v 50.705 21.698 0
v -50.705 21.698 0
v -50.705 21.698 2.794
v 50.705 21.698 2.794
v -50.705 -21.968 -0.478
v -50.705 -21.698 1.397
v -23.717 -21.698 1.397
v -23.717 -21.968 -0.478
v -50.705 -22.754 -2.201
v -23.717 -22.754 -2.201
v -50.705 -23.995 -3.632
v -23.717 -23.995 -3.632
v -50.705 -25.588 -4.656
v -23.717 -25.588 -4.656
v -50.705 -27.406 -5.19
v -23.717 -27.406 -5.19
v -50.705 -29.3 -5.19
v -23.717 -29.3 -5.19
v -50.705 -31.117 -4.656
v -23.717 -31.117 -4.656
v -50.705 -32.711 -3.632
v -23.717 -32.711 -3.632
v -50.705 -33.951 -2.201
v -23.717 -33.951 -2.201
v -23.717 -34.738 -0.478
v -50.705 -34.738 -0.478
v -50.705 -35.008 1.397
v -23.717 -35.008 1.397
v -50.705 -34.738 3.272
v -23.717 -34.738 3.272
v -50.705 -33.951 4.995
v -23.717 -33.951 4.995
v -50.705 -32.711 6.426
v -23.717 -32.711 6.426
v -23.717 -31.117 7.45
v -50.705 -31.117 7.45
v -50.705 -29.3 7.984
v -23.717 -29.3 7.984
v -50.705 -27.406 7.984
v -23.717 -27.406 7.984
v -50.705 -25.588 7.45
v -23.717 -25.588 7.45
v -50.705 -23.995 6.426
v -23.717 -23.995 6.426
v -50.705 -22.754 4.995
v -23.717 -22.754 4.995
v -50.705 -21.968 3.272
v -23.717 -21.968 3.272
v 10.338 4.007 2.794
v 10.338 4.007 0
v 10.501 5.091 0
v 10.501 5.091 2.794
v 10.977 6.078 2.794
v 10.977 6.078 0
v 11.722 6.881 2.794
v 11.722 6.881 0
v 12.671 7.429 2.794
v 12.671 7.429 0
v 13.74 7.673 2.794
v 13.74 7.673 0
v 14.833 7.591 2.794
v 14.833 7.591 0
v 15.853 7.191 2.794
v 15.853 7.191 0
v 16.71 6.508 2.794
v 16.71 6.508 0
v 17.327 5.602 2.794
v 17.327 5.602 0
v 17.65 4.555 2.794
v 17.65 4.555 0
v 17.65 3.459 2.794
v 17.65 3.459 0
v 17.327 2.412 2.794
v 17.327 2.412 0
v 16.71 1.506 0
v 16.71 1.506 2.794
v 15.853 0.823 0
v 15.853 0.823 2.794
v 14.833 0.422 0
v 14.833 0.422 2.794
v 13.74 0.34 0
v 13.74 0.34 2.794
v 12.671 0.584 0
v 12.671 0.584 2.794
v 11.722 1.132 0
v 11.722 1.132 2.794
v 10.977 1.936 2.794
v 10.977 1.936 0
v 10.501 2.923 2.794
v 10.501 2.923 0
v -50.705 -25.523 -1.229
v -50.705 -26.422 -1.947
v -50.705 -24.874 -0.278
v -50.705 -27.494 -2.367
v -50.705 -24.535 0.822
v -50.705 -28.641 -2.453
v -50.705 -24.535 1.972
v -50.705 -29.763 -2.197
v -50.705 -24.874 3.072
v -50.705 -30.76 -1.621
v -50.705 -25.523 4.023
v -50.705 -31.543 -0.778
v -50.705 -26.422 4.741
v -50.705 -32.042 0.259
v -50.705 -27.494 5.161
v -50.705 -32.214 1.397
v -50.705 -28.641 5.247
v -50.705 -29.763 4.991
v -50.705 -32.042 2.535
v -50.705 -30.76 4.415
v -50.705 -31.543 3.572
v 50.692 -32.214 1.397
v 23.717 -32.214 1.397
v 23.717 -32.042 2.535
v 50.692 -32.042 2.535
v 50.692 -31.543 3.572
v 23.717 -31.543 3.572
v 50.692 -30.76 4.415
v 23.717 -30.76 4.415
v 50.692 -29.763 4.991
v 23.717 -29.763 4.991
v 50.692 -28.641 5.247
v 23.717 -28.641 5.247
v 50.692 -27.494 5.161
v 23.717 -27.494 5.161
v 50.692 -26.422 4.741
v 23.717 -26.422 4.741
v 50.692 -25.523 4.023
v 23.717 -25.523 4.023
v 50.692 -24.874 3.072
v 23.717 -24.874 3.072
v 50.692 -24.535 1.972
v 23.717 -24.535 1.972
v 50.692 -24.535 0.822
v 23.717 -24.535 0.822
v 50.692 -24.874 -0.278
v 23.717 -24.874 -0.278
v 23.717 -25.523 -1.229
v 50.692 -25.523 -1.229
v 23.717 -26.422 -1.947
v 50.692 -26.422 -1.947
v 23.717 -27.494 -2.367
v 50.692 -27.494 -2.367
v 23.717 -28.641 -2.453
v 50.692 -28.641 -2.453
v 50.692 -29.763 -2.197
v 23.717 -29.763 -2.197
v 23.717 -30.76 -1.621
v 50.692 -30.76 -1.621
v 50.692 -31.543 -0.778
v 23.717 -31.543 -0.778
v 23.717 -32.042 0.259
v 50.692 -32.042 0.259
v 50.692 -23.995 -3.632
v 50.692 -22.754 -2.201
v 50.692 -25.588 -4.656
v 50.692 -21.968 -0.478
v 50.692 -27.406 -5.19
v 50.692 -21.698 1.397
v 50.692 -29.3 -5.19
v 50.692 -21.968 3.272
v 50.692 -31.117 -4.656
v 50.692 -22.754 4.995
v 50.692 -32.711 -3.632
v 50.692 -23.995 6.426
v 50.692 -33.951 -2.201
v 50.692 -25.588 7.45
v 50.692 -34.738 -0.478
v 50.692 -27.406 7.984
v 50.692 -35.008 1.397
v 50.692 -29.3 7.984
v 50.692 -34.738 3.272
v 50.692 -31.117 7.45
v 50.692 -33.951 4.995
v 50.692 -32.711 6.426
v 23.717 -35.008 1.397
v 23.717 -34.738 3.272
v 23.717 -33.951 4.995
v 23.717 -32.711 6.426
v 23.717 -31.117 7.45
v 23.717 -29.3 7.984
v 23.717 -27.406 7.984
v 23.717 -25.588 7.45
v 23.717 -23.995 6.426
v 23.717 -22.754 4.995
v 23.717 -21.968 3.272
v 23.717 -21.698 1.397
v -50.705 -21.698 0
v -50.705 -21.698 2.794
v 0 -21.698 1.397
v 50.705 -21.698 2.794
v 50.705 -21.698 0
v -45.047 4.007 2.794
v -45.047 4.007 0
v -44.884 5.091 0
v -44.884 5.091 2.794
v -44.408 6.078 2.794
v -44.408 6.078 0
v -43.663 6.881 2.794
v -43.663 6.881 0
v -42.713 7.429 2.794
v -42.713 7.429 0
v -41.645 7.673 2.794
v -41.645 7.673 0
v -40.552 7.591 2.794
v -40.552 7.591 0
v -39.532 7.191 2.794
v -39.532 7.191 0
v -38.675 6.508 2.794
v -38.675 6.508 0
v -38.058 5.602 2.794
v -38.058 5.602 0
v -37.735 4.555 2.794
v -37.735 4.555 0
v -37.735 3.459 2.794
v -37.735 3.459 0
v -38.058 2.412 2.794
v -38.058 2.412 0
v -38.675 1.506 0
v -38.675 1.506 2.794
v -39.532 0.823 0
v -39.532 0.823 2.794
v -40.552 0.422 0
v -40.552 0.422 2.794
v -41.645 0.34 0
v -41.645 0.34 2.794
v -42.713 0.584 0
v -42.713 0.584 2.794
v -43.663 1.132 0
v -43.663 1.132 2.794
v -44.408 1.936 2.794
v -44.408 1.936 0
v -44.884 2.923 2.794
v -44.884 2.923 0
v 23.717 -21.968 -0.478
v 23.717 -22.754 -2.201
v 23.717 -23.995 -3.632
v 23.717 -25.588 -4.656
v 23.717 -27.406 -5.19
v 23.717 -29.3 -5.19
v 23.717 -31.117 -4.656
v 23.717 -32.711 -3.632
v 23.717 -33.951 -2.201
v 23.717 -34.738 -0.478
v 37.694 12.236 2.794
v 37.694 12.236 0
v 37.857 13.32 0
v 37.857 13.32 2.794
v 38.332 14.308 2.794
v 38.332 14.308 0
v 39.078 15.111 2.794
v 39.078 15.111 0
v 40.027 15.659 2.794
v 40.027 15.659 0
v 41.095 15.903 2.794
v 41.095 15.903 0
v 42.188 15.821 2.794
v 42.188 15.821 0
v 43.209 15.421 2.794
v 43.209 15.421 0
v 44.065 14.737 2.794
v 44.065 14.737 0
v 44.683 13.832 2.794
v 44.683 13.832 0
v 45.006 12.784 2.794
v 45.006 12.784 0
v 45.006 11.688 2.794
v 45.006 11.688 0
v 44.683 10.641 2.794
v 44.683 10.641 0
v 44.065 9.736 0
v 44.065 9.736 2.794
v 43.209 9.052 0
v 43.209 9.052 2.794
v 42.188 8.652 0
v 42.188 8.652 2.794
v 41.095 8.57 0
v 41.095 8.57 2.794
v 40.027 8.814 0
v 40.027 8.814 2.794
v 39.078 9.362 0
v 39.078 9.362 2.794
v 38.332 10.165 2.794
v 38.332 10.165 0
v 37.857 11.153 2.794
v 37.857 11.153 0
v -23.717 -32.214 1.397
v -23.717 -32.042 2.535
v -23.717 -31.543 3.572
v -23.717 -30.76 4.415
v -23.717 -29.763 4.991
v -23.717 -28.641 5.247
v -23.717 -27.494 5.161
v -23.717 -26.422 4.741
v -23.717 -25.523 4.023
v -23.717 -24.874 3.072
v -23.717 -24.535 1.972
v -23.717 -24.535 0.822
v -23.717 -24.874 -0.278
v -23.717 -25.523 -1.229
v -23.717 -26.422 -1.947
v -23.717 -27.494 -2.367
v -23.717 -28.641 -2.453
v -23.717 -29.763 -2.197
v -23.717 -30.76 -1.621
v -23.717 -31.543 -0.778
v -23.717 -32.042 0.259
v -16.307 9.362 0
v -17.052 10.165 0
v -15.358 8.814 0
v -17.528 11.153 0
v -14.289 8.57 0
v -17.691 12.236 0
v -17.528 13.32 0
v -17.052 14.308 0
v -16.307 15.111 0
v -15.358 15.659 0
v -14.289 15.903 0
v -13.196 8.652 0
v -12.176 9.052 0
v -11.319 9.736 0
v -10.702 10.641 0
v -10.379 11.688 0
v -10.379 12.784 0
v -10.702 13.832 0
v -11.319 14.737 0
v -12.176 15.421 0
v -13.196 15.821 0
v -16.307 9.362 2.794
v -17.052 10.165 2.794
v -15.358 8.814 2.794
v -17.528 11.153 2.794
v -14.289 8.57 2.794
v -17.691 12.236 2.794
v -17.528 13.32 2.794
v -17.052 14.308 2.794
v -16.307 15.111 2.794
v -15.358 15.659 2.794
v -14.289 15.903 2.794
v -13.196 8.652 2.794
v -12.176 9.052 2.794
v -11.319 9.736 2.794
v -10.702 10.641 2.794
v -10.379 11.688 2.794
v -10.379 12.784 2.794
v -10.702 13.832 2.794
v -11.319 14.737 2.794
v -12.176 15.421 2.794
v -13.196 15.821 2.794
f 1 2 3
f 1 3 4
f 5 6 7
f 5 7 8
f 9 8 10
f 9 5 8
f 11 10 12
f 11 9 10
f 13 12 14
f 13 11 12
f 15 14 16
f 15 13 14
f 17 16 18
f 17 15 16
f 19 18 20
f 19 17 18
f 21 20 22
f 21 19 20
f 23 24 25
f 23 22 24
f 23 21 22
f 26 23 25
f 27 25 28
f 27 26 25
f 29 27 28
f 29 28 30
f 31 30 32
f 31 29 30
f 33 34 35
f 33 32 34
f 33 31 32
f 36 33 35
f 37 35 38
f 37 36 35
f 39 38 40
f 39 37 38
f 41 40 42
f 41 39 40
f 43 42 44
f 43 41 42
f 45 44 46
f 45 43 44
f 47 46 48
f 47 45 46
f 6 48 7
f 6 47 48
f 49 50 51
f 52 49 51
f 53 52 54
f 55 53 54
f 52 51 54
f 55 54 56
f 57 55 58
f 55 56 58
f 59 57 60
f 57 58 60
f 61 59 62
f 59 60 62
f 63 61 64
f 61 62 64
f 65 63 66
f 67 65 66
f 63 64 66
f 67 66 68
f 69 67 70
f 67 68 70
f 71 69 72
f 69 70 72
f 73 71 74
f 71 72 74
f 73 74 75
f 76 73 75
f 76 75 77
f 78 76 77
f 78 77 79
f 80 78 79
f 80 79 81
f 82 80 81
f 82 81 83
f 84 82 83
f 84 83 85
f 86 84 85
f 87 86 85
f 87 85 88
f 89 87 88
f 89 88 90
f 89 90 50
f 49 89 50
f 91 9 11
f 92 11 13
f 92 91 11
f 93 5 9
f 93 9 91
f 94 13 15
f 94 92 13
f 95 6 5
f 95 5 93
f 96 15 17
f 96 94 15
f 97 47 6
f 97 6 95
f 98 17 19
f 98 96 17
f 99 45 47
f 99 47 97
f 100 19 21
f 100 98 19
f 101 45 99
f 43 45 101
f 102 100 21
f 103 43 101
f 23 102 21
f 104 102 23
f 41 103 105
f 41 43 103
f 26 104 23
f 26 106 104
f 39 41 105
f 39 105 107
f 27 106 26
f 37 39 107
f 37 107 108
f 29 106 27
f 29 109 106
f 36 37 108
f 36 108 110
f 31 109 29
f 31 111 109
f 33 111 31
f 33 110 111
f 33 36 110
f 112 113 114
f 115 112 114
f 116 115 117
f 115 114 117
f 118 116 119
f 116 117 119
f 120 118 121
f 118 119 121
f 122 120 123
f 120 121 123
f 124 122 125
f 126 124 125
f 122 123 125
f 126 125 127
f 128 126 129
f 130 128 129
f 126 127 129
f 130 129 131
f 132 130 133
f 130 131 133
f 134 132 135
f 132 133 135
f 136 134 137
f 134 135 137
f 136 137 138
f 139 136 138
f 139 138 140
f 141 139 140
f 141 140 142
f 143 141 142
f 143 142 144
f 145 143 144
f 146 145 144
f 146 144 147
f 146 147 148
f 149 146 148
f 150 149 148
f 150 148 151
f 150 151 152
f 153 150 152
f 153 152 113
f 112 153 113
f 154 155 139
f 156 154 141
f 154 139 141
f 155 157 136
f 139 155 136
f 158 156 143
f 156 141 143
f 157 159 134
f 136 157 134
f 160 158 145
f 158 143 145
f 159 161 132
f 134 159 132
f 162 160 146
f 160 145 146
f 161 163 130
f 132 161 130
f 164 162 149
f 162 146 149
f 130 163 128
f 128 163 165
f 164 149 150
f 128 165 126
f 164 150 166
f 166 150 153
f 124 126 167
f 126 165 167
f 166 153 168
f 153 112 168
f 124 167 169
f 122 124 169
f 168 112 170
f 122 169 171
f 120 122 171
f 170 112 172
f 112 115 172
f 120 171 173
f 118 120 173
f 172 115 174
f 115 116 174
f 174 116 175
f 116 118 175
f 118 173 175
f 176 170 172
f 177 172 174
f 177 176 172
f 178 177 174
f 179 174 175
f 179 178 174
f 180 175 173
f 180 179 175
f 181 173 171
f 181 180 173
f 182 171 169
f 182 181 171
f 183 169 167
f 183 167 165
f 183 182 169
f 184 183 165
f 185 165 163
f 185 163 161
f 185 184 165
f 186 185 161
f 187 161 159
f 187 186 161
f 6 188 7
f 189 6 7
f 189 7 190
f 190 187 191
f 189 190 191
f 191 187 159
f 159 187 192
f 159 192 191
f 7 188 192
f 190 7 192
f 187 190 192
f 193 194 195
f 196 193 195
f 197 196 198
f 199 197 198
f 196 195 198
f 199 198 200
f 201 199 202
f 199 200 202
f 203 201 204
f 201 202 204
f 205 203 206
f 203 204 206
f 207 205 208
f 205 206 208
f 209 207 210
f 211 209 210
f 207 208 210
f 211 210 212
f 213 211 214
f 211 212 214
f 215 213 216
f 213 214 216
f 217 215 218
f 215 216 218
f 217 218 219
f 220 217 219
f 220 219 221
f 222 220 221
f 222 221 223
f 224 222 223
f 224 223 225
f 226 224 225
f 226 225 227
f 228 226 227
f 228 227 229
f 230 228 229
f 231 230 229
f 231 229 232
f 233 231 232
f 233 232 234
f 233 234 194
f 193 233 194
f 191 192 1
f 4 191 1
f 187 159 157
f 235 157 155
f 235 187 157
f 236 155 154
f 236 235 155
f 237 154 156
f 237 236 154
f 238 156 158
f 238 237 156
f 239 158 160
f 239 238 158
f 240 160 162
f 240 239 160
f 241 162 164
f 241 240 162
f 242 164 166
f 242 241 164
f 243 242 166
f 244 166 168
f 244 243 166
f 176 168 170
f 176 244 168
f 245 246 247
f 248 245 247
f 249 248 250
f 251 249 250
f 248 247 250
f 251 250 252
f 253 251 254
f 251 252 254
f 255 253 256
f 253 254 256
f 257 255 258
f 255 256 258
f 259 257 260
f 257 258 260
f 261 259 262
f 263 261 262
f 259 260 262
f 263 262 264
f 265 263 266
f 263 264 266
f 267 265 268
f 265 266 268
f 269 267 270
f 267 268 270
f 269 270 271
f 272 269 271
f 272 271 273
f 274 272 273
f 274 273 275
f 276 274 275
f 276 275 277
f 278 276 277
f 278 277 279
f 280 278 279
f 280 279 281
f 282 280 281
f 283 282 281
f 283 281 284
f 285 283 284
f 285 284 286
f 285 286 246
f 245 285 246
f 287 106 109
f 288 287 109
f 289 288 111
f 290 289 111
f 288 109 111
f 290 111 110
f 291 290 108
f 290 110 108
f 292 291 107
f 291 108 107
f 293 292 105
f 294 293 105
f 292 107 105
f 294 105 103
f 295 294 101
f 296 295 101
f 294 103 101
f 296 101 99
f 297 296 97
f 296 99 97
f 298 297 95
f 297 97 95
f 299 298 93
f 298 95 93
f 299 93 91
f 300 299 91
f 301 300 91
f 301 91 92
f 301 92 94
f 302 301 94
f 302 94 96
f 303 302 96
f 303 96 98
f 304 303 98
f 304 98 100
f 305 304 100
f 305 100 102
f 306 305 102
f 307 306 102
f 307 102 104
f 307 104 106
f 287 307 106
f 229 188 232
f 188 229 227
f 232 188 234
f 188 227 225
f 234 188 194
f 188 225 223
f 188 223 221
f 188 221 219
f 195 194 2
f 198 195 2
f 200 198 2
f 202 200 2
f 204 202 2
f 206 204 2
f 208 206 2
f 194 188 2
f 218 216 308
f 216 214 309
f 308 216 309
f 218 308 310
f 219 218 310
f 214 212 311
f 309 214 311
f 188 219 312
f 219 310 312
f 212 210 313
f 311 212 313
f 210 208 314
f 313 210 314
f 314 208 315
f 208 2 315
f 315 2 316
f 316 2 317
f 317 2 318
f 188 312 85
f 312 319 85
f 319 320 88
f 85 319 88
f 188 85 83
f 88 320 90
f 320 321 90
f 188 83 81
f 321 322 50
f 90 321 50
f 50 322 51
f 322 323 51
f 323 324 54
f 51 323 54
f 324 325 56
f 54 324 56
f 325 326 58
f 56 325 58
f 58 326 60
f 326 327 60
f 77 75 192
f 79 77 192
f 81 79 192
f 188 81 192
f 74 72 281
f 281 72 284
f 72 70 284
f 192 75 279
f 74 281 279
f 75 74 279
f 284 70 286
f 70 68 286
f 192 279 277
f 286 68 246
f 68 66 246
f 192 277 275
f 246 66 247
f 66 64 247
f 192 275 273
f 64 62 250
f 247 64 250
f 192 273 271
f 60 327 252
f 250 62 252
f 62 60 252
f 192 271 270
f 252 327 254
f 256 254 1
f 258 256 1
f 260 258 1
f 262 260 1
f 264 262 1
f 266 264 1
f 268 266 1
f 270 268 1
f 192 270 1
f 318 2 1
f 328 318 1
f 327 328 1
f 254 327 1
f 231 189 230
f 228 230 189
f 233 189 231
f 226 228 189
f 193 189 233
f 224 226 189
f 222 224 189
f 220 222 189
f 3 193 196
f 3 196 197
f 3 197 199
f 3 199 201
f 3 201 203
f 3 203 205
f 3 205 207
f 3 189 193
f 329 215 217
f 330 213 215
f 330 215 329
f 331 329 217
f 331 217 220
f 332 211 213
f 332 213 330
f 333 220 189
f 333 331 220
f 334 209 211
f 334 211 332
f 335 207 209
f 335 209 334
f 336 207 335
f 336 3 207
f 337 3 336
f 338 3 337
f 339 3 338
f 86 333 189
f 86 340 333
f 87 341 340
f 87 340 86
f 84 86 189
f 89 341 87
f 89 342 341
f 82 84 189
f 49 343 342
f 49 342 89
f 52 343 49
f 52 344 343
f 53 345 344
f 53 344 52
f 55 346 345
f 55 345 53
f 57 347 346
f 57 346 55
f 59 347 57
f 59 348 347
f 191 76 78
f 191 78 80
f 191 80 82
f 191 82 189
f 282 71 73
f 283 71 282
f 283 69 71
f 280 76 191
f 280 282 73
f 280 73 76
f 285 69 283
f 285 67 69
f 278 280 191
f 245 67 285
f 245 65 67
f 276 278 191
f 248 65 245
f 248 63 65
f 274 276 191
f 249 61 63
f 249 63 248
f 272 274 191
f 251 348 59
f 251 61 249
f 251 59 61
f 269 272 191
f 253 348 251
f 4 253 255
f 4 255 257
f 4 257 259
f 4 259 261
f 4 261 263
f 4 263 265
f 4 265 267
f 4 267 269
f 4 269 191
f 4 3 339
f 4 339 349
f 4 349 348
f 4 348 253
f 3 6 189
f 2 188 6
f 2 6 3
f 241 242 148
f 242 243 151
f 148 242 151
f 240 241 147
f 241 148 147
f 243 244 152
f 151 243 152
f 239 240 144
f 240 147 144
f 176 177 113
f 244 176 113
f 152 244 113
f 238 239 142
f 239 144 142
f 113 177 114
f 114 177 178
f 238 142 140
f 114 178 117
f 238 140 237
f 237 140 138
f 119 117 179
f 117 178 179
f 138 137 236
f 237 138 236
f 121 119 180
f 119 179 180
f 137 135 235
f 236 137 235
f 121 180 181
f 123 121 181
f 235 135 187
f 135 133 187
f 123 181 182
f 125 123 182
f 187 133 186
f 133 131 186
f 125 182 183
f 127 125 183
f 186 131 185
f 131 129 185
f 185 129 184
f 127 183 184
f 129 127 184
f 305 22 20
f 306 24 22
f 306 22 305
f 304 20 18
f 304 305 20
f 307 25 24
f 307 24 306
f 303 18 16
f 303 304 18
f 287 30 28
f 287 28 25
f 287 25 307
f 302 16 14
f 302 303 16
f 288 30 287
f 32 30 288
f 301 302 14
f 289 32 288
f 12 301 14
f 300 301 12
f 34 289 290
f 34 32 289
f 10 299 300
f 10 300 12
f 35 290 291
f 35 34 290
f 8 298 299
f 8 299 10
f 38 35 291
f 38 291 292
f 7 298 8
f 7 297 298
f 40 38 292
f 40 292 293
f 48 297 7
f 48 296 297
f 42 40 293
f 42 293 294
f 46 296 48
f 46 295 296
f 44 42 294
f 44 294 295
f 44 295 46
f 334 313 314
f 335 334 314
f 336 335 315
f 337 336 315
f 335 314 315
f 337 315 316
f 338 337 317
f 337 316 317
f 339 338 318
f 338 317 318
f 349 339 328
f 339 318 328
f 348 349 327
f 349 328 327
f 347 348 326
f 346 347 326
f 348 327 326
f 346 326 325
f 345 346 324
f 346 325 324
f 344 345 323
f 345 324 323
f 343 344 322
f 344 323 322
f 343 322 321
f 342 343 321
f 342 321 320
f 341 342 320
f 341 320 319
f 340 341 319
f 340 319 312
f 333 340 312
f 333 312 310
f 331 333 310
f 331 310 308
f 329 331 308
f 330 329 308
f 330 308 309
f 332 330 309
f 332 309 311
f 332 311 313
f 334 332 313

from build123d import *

# Parameters (mm, degrees)
F0_W          = 101.4095
F0_H          = 43.3959
F1_DEPTH      = 2.794
F2_R          = 6.6548
F2_R_2        = 3.8608
F3_DEPTH      = 101.3968
F4_R          = 6.6548
F4_R_2        = 3.8608
F5_DEPTH      = 23.71725
F5_DEPTH_BACK = 23.71725
F7_D          = 7.3533
F7_DEPTH      = 12.7


with BuildPart() as f1:
    # F0 (on Top) → F1 (new body)
    with BuildSketch(Plane.XY):
        Rectangle(F0_W, F0_H)
    extrude(amount=F1_DEPTH)

    # F2 (on face) → F3 (join)
    with BuildSketch(Plane(origin=(-50.70475, 0, 0), x_dir=(0, -1, 0), z_dir=(-1, 0, 0))):
        with Locations((28.35275, 1.397)):
            Circle(F2_R)
        with Locations((28.35275, 1.397)):
            Circle(F2_R_2, mode=Mode.SUBTRACT)
    extrude(amount=-F3_DEPTH)

    # F4 (on Right) → F5 (cut, two sides)
    with BuildSketch(Plane.YZ) as f5_sk:
        with Locations((-28.35275, 1.397)):
            Circle(F4_R)
        with Locations((-28.35275, 1.397)):
            Circle(F4_R_2, mode=Mode.SUBTRACT)
    extrude(amount=F5_DEPTH, mode=Mode.SUBTRACT)
    extrude(f5_sk.sketch, amount=-F5_DEPTH_BACK, mode=Mode.SUBTRACT)

    # F7
    with Locations(Plane.XY.offset(2.794)):
        with Locations((41.37025, 12.23645), (14.01445, 4.00685), (-14.01445, 12.23645), (-41.37025, 4.00685)):
            Hole(F7_D / 2, depth=F7_DEPTH)


solid = f1.part
